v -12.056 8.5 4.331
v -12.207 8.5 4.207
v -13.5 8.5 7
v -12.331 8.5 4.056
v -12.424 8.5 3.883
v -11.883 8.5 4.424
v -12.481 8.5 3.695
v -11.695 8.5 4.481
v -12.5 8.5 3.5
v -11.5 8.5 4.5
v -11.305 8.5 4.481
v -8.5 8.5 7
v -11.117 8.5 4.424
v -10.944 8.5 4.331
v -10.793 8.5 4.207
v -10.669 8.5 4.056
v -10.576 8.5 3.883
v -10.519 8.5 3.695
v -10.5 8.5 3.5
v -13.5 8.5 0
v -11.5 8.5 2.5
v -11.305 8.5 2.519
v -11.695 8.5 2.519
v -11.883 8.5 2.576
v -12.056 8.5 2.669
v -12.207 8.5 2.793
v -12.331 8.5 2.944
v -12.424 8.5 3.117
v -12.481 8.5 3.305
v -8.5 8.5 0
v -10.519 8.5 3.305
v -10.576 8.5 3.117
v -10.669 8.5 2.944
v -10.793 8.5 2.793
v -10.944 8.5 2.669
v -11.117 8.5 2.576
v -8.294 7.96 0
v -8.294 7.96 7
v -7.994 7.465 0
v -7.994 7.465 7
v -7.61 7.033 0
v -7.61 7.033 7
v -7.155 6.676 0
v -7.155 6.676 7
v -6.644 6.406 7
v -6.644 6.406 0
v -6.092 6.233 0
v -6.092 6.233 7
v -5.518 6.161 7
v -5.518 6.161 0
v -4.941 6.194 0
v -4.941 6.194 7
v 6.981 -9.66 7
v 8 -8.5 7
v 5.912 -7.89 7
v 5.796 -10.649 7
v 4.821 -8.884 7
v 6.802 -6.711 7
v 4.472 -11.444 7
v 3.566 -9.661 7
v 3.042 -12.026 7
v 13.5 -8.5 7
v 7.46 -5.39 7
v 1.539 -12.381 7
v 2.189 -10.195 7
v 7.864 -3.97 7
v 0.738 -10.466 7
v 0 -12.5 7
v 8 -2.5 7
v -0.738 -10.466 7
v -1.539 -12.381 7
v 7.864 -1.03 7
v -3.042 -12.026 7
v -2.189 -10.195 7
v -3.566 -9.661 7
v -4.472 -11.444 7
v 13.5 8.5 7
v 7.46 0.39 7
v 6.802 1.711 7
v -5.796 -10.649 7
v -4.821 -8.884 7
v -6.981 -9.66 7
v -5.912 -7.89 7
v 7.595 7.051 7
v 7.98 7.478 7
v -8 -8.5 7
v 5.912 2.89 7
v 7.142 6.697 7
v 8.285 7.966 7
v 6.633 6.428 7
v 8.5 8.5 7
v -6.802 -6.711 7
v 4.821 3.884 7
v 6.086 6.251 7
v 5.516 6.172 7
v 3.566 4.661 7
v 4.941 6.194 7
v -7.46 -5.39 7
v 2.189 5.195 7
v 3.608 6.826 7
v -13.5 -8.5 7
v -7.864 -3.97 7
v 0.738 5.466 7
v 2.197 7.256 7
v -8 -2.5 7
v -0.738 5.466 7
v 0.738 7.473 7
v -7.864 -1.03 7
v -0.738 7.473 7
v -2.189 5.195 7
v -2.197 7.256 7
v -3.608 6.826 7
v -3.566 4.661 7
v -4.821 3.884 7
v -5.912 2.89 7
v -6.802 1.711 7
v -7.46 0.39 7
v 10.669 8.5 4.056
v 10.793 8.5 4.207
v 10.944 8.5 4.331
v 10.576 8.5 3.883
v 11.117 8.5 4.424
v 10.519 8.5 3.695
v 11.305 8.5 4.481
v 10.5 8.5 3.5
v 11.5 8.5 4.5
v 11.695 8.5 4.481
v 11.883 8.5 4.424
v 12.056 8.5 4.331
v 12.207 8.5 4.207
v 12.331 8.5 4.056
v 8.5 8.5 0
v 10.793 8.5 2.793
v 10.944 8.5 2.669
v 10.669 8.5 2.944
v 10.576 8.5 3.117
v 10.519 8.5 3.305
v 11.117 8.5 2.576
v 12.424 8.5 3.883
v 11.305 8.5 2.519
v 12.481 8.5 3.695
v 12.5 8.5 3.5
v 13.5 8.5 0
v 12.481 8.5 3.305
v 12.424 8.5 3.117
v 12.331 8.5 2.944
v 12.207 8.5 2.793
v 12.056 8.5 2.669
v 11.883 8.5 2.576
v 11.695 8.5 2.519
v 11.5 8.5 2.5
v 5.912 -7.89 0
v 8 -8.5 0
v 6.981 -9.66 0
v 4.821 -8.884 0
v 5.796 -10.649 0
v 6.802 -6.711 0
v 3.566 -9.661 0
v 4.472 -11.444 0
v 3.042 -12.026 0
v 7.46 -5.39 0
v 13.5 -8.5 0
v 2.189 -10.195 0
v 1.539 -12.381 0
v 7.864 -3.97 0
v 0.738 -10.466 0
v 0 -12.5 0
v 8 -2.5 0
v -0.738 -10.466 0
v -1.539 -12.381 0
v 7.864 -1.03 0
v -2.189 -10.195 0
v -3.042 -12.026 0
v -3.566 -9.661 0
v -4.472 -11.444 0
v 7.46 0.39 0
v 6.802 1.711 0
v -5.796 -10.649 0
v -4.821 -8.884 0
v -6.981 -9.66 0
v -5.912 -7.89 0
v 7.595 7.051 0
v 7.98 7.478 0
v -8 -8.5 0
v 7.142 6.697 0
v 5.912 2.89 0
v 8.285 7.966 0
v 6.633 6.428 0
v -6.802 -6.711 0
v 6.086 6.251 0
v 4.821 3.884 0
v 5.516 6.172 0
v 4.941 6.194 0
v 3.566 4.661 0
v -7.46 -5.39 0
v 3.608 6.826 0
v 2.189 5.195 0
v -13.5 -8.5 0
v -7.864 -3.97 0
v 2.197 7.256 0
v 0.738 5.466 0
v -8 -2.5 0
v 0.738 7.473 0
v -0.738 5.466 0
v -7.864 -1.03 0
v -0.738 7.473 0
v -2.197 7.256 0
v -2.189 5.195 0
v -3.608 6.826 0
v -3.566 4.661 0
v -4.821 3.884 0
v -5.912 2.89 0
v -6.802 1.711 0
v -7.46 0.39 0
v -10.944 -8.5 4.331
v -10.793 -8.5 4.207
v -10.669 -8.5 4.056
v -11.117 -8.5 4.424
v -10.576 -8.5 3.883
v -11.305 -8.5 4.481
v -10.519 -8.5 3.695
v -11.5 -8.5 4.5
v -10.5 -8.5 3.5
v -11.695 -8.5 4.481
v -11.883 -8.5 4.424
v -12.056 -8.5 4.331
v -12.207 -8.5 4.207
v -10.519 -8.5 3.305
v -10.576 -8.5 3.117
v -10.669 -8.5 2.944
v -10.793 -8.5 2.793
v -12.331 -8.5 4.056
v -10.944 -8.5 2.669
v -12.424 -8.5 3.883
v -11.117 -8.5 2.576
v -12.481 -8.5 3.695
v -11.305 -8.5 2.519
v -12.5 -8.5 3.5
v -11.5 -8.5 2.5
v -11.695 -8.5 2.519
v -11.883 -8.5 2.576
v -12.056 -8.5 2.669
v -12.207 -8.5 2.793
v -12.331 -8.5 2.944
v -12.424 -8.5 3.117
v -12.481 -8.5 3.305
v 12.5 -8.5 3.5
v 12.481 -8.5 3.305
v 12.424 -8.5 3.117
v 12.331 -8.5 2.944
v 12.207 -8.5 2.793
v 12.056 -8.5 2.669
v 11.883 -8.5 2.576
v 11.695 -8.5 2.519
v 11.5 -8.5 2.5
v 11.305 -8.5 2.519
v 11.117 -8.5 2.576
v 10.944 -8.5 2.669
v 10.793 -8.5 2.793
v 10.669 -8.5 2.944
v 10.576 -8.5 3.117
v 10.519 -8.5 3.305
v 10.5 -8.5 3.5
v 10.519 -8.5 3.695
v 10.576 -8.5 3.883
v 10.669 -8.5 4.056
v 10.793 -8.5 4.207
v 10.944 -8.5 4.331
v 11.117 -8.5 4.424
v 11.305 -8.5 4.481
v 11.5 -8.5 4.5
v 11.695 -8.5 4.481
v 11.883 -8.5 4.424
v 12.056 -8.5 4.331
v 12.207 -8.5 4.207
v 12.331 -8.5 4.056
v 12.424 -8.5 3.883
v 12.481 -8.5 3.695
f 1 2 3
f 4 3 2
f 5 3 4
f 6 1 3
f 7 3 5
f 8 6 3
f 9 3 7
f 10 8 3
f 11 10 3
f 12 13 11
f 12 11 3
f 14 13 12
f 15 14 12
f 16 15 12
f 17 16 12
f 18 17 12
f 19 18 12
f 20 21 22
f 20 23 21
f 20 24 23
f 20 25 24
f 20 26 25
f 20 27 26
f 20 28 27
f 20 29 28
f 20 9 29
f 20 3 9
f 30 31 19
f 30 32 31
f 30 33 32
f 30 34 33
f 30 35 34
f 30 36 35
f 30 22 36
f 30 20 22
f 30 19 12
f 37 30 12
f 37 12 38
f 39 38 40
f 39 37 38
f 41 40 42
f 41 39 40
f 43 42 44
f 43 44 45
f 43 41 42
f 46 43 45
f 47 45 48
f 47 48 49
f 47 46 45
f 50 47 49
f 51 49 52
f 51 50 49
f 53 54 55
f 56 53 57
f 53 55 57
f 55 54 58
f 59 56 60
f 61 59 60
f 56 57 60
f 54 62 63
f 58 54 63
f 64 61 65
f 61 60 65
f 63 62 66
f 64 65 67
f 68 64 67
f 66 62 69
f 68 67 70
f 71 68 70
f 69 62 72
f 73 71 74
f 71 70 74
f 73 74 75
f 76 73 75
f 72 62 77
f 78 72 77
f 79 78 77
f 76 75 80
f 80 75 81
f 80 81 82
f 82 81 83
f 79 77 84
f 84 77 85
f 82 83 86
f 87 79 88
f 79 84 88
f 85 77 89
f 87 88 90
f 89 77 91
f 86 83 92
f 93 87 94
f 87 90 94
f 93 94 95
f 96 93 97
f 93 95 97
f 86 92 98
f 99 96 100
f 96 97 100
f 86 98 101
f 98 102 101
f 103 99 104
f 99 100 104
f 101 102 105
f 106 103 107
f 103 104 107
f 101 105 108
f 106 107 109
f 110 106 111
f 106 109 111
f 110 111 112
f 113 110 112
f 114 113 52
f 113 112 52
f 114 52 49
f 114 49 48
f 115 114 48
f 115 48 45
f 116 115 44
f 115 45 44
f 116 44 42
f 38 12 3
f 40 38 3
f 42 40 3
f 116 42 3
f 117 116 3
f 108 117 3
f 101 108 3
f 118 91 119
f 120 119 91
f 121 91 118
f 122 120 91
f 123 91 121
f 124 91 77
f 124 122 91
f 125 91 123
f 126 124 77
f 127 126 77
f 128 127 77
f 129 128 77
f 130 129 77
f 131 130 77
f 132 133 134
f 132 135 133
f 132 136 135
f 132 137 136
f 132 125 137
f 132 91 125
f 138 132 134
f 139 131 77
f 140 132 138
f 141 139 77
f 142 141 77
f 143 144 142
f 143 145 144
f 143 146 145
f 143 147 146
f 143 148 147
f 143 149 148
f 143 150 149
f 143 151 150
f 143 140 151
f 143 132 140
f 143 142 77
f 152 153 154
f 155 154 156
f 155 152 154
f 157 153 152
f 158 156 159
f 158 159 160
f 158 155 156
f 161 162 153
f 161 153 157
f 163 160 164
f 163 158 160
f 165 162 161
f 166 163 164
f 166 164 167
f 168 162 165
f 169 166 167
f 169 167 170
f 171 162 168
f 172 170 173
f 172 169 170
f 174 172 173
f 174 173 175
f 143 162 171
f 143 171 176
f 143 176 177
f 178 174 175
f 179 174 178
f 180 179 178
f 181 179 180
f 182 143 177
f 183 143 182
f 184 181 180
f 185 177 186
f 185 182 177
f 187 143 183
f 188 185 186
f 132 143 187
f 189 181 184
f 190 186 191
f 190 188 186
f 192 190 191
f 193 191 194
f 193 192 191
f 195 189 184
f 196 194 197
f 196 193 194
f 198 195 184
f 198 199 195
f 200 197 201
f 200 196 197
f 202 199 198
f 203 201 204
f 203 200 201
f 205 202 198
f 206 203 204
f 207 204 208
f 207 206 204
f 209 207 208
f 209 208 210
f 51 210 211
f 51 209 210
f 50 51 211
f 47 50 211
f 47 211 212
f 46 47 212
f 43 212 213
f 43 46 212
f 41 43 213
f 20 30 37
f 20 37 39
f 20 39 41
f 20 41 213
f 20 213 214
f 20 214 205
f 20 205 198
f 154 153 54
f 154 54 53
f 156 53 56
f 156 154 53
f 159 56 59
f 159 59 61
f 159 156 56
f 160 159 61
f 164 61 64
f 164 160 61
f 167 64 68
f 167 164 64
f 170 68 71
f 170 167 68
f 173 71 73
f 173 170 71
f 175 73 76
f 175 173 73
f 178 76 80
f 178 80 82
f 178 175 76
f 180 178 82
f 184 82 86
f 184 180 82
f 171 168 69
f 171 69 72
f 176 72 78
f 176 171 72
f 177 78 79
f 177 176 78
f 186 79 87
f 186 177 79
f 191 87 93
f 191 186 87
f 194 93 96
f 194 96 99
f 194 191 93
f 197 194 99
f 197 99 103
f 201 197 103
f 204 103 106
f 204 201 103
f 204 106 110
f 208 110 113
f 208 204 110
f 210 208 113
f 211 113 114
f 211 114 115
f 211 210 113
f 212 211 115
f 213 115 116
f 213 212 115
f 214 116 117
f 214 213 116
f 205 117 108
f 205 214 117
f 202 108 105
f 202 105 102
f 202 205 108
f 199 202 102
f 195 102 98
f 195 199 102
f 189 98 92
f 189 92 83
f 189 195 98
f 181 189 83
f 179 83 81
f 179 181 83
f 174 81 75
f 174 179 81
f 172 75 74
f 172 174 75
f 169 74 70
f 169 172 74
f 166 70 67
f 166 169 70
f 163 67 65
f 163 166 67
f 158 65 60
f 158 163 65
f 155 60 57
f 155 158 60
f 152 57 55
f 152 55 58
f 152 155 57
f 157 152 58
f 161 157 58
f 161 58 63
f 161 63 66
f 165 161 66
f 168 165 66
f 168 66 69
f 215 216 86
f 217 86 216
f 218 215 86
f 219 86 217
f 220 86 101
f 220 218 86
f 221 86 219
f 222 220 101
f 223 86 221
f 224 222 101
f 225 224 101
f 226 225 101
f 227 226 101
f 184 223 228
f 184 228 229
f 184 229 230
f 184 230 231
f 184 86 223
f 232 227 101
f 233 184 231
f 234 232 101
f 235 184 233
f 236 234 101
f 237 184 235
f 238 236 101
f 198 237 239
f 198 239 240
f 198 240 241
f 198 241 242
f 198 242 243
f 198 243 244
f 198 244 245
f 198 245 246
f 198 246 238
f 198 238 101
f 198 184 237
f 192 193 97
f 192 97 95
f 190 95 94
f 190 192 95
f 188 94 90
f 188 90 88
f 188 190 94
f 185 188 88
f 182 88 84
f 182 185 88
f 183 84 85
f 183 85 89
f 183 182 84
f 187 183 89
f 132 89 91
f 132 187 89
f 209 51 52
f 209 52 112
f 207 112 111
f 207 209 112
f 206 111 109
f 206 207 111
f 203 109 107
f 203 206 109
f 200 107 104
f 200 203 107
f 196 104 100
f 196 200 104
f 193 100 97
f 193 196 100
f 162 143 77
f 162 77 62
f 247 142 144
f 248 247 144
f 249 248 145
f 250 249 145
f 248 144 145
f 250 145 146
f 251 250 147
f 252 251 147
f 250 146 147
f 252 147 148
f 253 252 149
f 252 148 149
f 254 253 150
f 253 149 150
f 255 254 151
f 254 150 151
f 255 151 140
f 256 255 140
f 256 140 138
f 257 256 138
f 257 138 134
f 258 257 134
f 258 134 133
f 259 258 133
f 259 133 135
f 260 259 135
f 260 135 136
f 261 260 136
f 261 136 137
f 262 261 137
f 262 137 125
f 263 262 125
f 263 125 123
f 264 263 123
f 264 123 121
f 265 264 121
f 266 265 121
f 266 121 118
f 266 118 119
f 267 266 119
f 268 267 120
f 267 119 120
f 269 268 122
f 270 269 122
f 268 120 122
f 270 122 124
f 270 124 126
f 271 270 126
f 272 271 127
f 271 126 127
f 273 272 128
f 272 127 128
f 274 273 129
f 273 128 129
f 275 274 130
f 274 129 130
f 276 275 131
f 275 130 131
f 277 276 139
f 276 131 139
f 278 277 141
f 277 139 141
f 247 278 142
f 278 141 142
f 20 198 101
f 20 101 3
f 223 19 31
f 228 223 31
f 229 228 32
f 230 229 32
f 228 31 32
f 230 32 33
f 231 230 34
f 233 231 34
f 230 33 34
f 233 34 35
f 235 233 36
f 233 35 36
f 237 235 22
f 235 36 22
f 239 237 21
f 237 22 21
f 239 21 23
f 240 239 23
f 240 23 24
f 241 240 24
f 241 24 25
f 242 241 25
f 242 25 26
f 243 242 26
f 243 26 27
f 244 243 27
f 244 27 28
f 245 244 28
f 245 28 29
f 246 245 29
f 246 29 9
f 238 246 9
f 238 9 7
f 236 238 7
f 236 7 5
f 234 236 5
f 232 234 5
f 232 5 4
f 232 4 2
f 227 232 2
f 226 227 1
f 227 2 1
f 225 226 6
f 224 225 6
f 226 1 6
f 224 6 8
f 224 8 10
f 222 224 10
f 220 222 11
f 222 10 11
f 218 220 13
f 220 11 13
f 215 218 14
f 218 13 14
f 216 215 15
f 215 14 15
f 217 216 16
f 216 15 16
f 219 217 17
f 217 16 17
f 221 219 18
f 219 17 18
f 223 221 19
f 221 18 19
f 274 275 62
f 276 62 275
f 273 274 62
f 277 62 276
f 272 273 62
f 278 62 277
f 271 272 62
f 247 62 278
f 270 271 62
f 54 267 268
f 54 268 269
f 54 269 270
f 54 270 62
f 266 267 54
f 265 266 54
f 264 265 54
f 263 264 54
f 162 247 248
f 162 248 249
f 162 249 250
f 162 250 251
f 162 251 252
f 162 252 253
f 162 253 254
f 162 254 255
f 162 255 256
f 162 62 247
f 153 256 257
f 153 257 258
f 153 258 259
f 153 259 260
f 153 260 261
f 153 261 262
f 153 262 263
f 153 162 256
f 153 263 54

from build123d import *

# Parameters (mm, degrees)
SKETCH1_R           = 8
BOSS_EXTRUDE1_DEPTH = 7
SKETCH2_R           = 1
CUT_EXTRUDE1_DEPTH  = 22


with BuildPart() as part:
    # Sketch1 → Boss-Extrude1 (new body)
    with BuildSketch(Plane.XY):
        with BuildLine():
            Line((-13.5, 8.5), (-8.5, 8.5))
            ThreePointArc((-8.5, 8.5), (-7.155483469, 6.675741758), (-4.941082547, 6.194003868))
            ThreePointArc((-4.941082547, 6.194003868), (0, 7.5), (4.941082547, 6.194003868))
            ThreePointArc((4.941082547, 6.194003868), (7.141563471, 6.697224935), (8.5, 8.5))
            Line((8.5, 8.5), (13.5, 8.5))
            Line((13.5, 8.5), (13.5, -8.5))
            Line((13.5, -8.5), (8, -8.5))
            ThreePointArc((8, -8.5), (0, -12.5), (-8, -8.5))
            Line((-8, -8.5), (-13.5, -8.5))
            Line((-13.5, -8.5), (-13.5, 8.5))
        make_face()
        with Locations((0, -2.5)):
            Circle(SKETCH1_R, mode=Mode.SUBTRACT)
    extrude(amount=BOSS_EXTRUDE1_DEPTH)

    # Sketch2 → Cut-Extrude1 (cut, through all)
    with BuildSketch(Plane(origin=(0, 8.5, 0), x_dir=(1, 0, 0), z_dir=(0, 1, 0))):
        with Locations((-11.5, -3.5)):
            Circle(SKETCH2_R)
        with Locations((11.5, -3.5)):
            Circle(SKETCH2_R)
    extrude(amount=-CUT_EXTRUDE1_DEPTH, mode=Mode.SUBTRACT)


solid = part.part
